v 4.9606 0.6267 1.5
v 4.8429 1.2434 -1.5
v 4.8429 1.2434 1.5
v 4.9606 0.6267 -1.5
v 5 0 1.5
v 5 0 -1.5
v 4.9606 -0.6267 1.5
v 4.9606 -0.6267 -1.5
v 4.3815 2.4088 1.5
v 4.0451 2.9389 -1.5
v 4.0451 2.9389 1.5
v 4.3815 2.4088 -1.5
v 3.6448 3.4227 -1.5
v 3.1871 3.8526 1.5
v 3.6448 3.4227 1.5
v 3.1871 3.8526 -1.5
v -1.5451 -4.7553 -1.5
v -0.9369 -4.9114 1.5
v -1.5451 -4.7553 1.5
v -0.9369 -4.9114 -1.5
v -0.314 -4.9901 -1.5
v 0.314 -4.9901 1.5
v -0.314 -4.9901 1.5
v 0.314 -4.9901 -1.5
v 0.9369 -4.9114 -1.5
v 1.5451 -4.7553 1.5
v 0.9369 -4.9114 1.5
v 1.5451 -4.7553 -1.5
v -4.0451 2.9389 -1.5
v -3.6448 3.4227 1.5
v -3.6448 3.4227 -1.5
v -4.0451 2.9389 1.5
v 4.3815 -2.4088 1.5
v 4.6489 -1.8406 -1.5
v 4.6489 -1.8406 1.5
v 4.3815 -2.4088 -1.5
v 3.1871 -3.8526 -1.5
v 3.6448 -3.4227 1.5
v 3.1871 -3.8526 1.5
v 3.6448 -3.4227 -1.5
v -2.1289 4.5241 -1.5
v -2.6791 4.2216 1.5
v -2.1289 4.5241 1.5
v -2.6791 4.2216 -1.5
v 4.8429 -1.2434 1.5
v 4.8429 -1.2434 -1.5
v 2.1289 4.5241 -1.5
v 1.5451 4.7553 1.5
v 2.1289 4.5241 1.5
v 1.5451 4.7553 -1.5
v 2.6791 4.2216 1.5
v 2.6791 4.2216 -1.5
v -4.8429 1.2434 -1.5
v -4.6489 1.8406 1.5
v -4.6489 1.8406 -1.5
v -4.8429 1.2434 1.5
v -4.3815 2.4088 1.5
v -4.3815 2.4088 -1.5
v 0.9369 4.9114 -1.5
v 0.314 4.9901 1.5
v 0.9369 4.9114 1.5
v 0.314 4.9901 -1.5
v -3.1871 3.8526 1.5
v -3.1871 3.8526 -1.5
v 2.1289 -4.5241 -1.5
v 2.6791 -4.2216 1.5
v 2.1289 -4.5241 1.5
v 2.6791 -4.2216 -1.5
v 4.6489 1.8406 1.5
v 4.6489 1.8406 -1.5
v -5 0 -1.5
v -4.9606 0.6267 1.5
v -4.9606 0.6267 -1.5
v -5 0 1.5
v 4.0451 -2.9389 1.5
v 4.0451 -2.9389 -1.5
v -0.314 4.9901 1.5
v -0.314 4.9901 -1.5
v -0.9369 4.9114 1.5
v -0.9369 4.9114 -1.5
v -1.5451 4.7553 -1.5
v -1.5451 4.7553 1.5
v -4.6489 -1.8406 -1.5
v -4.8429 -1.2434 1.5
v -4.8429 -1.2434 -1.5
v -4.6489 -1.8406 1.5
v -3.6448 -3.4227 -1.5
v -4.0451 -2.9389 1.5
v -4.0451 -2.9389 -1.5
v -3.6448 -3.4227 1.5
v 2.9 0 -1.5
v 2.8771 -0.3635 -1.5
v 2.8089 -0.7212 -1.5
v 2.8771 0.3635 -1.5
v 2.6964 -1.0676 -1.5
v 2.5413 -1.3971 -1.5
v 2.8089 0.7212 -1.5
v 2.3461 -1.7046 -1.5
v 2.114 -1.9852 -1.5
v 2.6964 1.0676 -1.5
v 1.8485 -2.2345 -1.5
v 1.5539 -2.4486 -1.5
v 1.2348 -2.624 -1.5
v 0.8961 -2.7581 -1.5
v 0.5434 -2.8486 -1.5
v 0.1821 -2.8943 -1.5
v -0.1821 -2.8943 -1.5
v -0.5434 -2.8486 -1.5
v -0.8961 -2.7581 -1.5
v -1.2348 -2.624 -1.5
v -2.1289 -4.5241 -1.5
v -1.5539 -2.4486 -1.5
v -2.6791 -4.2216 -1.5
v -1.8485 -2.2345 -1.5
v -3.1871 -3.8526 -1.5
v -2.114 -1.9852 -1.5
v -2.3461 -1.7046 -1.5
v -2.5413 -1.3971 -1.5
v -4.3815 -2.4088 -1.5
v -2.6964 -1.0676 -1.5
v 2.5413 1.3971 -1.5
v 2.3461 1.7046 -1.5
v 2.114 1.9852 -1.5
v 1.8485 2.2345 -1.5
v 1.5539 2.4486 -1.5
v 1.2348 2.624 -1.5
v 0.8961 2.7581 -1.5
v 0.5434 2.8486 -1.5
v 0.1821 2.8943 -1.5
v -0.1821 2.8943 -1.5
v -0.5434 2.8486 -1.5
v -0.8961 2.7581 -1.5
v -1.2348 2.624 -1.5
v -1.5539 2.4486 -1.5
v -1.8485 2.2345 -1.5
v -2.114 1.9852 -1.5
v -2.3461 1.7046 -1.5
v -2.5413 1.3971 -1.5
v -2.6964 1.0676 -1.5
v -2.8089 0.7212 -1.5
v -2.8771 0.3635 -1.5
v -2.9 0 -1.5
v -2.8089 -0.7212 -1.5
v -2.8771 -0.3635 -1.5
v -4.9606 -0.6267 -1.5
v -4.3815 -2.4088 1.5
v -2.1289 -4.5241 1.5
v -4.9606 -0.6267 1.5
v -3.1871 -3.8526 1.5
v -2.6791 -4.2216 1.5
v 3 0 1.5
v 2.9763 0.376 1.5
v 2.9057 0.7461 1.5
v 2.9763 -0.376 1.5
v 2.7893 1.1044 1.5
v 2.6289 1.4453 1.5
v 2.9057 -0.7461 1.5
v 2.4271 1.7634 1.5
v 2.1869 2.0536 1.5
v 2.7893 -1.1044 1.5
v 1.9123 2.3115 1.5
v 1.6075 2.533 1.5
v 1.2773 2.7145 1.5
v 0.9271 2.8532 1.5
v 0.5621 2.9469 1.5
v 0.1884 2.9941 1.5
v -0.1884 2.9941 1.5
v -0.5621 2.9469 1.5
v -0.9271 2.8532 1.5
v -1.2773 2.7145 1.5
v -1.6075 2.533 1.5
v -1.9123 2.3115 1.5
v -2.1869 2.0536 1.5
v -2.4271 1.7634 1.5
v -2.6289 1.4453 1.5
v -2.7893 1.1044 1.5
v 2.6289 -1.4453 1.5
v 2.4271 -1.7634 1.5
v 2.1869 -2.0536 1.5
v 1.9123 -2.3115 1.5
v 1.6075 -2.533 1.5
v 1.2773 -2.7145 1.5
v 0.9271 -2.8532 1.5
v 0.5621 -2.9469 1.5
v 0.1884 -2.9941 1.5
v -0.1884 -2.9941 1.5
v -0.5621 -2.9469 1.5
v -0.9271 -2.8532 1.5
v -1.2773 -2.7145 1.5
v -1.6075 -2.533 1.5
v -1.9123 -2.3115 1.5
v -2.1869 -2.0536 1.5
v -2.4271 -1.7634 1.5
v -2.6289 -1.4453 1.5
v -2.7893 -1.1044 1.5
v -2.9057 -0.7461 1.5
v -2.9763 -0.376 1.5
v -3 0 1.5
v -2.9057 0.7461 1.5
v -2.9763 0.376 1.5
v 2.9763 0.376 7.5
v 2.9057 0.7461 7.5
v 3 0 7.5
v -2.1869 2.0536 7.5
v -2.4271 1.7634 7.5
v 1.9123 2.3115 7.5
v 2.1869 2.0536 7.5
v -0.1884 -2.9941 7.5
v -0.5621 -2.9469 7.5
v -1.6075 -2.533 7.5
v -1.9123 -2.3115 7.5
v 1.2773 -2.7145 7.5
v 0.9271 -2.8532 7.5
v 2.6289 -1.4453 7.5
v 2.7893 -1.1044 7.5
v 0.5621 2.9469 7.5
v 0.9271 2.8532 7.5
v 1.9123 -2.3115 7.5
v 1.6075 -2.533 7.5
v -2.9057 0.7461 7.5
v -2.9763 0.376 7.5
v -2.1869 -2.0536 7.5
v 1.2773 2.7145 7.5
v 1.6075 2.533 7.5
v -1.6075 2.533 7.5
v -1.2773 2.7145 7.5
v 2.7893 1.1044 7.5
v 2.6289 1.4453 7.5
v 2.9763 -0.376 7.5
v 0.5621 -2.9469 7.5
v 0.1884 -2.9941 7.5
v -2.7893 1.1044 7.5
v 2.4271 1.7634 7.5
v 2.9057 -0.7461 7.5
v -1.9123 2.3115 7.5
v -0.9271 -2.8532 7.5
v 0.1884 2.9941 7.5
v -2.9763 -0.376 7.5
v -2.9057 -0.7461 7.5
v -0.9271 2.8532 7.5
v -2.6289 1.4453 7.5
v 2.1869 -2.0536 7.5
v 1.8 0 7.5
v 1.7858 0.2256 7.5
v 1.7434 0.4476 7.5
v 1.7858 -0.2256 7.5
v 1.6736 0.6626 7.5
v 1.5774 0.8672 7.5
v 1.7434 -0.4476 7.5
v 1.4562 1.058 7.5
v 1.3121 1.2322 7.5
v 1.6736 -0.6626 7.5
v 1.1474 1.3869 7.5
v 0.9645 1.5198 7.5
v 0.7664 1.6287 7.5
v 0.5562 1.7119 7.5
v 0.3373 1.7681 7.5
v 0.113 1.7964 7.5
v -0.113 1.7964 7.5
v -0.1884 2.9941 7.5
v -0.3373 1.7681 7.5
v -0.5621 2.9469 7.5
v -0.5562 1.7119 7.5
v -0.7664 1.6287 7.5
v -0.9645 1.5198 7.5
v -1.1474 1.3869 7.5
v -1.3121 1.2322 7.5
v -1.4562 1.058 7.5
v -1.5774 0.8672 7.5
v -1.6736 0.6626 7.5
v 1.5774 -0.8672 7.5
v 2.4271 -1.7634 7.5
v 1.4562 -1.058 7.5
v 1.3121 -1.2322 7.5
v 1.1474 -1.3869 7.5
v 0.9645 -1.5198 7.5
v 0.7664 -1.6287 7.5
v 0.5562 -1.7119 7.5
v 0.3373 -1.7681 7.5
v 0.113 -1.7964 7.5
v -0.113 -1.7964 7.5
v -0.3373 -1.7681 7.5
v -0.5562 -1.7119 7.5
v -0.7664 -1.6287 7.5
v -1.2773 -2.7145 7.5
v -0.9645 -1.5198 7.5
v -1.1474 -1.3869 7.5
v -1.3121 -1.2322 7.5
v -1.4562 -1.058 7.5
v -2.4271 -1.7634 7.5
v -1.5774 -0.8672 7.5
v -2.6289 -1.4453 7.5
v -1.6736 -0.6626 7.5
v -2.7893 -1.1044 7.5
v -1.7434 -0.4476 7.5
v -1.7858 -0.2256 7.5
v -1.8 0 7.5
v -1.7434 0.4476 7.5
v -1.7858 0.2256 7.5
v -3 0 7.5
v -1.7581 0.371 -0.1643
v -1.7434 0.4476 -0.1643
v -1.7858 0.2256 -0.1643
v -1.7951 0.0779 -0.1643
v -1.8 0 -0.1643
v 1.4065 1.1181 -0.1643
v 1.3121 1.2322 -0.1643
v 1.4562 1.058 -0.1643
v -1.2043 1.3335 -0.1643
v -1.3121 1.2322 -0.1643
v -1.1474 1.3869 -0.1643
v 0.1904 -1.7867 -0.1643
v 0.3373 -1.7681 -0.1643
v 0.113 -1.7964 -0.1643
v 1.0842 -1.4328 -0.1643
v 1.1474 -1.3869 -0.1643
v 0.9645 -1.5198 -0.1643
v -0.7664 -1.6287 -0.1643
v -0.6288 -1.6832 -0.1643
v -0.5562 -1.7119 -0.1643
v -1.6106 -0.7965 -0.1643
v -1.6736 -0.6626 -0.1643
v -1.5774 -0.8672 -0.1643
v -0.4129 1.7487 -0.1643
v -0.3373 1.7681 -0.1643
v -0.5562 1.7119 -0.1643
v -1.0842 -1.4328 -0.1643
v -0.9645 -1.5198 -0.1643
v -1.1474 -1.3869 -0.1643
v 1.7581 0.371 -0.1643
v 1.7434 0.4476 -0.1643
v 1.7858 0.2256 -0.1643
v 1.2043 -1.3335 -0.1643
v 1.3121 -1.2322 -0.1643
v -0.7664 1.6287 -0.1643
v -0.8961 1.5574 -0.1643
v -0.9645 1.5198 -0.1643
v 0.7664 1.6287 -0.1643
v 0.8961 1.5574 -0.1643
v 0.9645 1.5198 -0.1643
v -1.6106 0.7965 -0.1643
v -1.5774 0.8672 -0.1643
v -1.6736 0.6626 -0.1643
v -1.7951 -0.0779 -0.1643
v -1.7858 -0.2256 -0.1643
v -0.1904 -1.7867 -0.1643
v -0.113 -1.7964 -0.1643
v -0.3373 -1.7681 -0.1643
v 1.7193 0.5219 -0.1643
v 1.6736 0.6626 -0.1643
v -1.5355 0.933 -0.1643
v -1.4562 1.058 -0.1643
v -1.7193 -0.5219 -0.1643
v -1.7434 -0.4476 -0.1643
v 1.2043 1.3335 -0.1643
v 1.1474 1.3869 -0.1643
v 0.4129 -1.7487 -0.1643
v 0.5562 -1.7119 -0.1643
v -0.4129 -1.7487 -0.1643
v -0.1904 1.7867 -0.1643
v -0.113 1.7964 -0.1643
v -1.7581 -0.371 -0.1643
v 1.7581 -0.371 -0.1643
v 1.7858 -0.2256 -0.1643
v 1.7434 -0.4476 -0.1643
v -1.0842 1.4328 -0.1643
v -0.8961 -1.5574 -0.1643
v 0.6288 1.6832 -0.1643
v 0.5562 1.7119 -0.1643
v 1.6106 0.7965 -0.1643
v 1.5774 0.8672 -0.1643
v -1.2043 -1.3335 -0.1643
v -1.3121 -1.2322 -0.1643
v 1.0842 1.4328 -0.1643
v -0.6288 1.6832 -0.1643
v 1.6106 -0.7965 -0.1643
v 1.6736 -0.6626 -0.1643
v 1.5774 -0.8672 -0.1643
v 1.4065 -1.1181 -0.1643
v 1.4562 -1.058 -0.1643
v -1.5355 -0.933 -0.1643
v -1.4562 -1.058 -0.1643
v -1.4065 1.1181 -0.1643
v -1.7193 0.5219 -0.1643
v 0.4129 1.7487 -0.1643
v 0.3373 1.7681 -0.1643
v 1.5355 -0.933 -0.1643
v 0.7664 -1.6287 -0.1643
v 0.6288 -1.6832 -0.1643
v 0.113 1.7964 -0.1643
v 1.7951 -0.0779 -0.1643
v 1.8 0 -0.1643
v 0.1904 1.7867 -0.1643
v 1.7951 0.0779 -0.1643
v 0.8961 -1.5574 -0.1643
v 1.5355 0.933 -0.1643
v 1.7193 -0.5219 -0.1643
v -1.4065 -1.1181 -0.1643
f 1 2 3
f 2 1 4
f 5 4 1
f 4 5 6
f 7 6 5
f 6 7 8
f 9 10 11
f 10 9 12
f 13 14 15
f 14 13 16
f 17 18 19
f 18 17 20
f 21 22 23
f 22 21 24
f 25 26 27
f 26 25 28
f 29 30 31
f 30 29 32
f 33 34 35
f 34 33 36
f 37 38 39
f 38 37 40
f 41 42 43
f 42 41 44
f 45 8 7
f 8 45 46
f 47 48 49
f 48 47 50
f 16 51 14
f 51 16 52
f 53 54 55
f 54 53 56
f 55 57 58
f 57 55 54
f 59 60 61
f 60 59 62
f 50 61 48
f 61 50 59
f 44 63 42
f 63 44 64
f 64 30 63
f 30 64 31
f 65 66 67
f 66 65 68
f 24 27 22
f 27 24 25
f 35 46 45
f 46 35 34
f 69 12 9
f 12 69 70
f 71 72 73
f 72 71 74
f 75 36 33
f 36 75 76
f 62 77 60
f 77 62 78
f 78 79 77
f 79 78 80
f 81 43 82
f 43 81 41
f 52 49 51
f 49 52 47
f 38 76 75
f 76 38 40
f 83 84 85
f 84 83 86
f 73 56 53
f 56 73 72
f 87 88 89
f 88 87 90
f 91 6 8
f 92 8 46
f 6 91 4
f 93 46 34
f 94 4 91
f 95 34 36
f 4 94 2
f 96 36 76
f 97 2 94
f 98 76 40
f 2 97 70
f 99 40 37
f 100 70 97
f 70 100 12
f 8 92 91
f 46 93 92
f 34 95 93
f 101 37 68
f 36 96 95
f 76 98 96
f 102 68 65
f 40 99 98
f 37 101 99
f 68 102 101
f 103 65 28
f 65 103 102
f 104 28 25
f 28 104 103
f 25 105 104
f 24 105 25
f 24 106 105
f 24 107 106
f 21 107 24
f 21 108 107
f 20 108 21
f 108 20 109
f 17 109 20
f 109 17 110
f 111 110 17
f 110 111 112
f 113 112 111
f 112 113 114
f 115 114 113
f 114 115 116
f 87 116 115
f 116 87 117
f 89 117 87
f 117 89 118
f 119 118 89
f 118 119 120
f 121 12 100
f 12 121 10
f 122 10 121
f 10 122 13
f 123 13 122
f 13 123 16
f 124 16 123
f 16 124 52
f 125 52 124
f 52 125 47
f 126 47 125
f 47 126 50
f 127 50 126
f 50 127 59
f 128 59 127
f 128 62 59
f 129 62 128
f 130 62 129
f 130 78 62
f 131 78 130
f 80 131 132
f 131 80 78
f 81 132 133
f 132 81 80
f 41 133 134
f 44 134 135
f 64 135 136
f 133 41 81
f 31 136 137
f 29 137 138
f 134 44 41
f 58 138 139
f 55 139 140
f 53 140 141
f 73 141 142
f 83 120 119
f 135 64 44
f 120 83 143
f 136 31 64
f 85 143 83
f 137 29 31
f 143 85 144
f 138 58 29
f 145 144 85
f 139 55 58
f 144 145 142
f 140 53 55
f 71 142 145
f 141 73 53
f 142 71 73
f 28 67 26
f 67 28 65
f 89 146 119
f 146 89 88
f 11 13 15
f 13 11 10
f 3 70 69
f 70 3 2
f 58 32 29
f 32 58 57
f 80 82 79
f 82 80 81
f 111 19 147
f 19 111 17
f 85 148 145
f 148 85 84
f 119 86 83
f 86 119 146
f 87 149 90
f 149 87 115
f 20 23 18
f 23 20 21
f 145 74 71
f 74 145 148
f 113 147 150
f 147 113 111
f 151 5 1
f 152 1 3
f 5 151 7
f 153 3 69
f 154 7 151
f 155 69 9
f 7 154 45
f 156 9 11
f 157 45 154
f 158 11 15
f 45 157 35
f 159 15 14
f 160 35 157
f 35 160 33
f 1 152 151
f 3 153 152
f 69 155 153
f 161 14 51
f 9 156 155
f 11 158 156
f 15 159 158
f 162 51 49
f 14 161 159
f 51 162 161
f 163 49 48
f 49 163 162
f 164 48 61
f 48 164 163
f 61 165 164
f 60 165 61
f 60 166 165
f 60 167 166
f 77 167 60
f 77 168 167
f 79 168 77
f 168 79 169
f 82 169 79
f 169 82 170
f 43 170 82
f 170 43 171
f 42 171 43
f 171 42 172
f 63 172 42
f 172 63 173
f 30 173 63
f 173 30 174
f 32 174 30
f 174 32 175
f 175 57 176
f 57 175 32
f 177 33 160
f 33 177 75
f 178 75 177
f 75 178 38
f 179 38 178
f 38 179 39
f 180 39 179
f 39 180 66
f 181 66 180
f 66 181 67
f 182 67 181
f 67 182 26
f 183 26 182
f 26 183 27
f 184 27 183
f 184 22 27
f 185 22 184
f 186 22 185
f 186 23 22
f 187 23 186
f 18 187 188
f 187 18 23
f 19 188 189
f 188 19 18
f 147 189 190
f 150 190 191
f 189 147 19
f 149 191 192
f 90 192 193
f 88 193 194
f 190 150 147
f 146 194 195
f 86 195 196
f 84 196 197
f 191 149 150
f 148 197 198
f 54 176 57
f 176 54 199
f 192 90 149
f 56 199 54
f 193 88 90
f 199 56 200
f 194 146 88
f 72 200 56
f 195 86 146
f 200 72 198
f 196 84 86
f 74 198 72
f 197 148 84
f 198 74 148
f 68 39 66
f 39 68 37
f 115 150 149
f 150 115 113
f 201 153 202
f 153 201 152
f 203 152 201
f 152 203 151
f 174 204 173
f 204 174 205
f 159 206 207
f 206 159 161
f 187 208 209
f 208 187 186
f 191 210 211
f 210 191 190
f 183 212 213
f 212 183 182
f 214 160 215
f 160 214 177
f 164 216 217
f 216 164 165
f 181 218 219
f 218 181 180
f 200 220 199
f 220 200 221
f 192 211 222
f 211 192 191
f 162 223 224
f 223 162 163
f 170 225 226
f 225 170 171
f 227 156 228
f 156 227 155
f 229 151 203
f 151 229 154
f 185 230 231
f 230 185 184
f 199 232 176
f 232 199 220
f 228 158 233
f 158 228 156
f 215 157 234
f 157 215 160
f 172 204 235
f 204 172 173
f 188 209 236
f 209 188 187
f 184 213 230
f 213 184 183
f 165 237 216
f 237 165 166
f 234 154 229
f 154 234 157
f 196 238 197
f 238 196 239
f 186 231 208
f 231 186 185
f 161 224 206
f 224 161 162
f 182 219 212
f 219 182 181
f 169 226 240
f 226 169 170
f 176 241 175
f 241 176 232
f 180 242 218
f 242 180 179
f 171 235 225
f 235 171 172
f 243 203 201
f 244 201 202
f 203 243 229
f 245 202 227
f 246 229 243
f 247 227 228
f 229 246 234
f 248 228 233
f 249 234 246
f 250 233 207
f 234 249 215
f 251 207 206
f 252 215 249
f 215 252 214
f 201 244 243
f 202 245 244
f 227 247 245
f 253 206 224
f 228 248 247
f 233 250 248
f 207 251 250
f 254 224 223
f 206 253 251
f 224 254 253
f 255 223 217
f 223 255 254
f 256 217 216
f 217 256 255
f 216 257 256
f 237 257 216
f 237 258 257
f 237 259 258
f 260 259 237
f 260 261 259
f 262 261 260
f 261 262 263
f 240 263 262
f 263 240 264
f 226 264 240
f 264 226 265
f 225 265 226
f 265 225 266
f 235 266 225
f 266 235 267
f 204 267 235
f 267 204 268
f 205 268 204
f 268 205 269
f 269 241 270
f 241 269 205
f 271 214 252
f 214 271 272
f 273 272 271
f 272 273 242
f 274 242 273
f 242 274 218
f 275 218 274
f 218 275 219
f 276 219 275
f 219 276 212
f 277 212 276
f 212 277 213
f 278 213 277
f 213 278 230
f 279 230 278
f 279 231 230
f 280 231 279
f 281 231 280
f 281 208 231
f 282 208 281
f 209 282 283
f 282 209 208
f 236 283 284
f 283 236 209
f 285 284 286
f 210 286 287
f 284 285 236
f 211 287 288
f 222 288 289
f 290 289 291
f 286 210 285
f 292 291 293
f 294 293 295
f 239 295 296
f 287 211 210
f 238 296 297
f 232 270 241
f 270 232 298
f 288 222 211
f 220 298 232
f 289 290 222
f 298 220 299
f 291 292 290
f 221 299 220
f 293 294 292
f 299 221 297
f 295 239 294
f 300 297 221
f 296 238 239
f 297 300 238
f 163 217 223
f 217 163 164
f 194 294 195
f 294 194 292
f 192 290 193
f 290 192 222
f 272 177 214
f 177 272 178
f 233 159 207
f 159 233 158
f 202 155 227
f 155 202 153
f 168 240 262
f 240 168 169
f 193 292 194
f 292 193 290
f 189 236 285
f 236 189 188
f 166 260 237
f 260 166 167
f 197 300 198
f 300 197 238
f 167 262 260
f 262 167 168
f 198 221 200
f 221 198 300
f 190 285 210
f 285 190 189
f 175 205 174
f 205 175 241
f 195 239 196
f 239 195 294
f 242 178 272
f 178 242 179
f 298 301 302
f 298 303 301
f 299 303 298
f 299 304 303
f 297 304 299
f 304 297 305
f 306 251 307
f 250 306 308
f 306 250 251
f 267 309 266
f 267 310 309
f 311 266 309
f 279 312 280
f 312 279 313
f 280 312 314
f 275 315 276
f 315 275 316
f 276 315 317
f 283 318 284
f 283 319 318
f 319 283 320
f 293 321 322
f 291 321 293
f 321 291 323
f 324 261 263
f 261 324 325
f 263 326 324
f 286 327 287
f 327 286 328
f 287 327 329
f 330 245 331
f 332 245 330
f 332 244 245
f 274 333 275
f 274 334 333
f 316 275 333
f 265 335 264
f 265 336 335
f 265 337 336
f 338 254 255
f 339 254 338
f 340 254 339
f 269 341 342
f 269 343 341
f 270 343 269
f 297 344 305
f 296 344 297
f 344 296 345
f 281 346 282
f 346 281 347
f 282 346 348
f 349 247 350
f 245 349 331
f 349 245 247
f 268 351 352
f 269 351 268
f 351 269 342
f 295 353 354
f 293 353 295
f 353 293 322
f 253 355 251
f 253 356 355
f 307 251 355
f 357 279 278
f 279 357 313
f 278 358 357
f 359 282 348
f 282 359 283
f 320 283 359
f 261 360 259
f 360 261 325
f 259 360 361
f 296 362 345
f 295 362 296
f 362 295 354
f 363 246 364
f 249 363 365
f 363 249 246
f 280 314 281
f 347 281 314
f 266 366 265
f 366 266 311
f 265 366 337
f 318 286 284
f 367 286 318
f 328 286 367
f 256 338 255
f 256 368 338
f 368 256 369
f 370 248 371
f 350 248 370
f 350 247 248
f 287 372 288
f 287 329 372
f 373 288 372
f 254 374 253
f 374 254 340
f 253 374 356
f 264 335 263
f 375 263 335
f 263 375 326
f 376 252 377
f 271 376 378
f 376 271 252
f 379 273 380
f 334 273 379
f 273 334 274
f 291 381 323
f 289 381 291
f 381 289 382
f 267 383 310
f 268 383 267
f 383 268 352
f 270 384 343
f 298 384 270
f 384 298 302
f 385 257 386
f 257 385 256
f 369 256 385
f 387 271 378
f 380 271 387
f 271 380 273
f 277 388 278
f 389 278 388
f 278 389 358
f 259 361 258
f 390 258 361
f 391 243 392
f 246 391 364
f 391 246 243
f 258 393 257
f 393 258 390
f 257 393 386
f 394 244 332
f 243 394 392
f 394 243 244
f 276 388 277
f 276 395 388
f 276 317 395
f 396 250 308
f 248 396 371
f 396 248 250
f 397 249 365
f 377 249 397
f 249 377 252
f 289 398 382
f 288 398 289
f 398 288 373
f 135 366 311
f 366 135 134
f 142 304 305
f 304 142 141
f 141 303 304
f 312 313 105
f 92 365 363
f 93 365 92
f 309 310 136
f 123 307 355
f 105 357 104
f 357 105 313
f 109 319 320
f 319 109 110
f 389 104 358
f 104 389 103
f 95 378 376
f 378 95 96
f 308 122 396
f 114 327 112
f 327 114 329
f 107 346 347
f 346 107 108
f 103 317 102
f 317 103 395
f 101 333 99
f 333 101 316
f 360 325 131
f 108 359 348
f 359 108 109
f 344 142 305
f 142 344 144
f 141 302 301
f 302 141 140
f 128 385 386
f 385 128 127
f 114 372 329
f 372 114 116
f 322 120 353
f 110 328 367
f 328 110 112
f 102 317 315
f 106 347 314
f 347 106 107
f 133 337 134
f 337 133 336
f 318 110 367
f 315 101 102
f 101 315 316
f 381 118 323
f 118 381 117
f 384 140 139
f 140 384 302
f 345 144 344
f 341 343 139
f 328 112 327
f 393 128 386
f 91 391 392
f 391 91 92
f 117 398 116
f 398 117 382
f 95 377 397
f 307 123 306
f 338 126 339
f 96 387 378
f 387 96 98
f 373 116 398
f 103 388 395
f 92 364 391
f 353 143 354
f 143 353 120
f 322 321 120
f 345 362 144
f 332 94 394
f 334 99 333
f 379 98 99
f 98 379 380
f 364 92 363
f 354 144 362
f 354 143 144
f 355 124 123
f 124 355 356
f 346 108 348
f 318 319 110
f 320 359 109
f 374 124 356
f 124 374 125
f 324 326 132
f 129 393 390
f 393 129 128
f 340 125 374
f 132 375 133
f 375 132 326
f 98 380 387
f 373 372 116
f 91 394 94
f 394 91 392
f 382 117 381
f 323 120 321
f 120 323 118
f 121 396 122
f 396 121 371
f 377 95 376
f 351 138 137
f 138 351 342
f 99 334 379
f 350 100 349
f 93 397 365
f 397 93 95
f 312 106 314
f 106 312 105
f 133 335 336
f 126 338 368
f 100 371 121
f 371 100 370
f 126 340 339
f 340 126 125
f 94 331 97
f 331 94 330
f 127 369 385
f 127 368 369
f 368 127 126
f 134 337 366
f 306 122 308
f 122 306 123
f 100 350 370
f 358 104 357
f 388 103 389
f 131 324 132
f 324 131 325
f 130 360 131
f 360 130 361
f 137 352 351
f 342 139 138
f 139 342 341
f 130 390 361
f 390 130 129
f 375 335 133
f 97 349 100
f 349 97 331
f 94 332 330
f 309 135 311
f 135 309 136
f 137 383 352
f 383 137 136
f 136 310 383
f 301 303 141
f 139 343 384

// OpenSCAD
$fn = 50;


difference() {
	union() {
		translate(v = [0, 0, -1.5000000000]) {
			cylinder(h = 3, r = 5.0000000000);
		}
		translate(v = [0, 0, -1.5000000000]) {
			cylinder(h = 9, r = 3.0000000000);
		}
	}
	union() {
		translate(v = [0, 0, -1.5000000000]) {
			rotate(a = [0, 180, 0]) {
				difference() {
					union() {
						translate(v = [0, 0, -9.0000000000]) {
							cylinder(h = 9, r = 1.5000000000);
						}
						translate(v = [0, 0, -9.0000000000]) {
							cylinder(h = 9, r = 1.8000000000);
						}
						translate(v = [0, 0, -1.7000000000]) {
							cylinder(h = 1.7000000000, r1 = 1.5000000000, r2 = 2.9000000000);
						}
						translate(v = [0, 0, -9.0000000000]) {
							cylinder(h = 9, r = 1.5000000000);
						}
					}
					union();
				}
			}
		}
		translate(v = [0, 0, -100.0000000000]) {
			cylinder(h = 200, r = 1.5000000000);
		}
	}
}
